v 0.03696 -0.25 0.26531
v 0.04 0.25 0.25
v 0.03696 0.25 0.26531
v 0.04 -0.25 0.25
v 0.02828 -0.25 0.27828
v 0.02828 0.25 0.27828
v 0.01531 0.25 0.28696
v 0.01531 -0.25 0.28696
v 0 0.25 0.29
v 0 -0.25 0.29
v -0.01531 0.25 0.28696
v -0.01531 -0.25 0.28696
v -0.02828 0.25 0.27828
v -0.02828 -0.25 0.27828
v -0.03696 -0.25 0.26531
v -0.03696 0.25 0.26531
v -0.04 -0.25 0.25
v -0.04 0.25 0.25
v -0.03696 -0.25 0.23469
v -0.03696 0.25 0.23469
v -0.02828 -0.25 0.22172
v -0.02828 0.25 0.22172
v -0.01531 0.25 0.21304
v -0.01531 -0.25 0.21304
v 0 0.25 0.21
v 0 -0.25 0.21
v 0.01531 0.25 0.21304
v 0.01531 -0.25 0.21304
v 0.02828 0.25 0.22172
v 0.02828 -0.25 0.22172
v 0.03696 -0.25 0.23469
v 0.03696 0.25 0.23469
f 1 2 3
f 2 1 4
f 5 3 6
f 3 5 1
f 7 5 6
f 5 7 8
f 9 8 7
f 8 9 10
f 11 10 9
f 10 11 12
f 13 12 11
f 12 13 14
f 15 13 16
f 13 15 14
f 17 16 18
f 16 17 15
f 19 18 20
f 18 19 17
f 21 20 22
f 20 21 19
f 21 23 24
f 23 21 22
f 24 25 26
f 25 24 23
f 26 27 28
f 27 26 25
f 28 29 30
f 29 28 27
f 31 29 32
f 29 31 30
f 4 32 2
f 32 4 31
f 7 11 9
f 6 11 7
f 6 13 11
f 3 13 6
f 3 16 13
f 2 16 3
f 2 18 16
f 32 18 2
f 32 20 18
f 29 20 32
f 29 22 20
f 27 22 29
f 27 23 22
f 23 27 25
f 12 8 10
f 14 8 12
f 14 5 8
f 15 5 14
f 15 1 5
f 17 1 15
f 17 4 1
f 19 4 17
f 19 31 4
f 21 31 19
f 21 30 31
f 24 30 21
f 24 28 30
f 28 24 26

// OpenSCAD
use <lib.scad>

module body() {
	translate([0,0,0.25]) rotate([90,0,0]) cyl(0.2, 0.2, 0.4);
}

module foot() {
	translate([0,0,0.1]) rotate([0,-90,0]) cyl(0.2, 0.2, 0.3, $fn=3);
}

module shaft() {
	translate([0,0,0.25]) rotate([90,0,0]) cyl(0.04, 0.04, 0.5);
}

hd = 16;
ld = 8;

//body($fn=hd);
//body($fn=ld);
//foot($fn=hd);
//foot($fn=ld);
shaft($fn=hd);
//shaft($fn=ld);
